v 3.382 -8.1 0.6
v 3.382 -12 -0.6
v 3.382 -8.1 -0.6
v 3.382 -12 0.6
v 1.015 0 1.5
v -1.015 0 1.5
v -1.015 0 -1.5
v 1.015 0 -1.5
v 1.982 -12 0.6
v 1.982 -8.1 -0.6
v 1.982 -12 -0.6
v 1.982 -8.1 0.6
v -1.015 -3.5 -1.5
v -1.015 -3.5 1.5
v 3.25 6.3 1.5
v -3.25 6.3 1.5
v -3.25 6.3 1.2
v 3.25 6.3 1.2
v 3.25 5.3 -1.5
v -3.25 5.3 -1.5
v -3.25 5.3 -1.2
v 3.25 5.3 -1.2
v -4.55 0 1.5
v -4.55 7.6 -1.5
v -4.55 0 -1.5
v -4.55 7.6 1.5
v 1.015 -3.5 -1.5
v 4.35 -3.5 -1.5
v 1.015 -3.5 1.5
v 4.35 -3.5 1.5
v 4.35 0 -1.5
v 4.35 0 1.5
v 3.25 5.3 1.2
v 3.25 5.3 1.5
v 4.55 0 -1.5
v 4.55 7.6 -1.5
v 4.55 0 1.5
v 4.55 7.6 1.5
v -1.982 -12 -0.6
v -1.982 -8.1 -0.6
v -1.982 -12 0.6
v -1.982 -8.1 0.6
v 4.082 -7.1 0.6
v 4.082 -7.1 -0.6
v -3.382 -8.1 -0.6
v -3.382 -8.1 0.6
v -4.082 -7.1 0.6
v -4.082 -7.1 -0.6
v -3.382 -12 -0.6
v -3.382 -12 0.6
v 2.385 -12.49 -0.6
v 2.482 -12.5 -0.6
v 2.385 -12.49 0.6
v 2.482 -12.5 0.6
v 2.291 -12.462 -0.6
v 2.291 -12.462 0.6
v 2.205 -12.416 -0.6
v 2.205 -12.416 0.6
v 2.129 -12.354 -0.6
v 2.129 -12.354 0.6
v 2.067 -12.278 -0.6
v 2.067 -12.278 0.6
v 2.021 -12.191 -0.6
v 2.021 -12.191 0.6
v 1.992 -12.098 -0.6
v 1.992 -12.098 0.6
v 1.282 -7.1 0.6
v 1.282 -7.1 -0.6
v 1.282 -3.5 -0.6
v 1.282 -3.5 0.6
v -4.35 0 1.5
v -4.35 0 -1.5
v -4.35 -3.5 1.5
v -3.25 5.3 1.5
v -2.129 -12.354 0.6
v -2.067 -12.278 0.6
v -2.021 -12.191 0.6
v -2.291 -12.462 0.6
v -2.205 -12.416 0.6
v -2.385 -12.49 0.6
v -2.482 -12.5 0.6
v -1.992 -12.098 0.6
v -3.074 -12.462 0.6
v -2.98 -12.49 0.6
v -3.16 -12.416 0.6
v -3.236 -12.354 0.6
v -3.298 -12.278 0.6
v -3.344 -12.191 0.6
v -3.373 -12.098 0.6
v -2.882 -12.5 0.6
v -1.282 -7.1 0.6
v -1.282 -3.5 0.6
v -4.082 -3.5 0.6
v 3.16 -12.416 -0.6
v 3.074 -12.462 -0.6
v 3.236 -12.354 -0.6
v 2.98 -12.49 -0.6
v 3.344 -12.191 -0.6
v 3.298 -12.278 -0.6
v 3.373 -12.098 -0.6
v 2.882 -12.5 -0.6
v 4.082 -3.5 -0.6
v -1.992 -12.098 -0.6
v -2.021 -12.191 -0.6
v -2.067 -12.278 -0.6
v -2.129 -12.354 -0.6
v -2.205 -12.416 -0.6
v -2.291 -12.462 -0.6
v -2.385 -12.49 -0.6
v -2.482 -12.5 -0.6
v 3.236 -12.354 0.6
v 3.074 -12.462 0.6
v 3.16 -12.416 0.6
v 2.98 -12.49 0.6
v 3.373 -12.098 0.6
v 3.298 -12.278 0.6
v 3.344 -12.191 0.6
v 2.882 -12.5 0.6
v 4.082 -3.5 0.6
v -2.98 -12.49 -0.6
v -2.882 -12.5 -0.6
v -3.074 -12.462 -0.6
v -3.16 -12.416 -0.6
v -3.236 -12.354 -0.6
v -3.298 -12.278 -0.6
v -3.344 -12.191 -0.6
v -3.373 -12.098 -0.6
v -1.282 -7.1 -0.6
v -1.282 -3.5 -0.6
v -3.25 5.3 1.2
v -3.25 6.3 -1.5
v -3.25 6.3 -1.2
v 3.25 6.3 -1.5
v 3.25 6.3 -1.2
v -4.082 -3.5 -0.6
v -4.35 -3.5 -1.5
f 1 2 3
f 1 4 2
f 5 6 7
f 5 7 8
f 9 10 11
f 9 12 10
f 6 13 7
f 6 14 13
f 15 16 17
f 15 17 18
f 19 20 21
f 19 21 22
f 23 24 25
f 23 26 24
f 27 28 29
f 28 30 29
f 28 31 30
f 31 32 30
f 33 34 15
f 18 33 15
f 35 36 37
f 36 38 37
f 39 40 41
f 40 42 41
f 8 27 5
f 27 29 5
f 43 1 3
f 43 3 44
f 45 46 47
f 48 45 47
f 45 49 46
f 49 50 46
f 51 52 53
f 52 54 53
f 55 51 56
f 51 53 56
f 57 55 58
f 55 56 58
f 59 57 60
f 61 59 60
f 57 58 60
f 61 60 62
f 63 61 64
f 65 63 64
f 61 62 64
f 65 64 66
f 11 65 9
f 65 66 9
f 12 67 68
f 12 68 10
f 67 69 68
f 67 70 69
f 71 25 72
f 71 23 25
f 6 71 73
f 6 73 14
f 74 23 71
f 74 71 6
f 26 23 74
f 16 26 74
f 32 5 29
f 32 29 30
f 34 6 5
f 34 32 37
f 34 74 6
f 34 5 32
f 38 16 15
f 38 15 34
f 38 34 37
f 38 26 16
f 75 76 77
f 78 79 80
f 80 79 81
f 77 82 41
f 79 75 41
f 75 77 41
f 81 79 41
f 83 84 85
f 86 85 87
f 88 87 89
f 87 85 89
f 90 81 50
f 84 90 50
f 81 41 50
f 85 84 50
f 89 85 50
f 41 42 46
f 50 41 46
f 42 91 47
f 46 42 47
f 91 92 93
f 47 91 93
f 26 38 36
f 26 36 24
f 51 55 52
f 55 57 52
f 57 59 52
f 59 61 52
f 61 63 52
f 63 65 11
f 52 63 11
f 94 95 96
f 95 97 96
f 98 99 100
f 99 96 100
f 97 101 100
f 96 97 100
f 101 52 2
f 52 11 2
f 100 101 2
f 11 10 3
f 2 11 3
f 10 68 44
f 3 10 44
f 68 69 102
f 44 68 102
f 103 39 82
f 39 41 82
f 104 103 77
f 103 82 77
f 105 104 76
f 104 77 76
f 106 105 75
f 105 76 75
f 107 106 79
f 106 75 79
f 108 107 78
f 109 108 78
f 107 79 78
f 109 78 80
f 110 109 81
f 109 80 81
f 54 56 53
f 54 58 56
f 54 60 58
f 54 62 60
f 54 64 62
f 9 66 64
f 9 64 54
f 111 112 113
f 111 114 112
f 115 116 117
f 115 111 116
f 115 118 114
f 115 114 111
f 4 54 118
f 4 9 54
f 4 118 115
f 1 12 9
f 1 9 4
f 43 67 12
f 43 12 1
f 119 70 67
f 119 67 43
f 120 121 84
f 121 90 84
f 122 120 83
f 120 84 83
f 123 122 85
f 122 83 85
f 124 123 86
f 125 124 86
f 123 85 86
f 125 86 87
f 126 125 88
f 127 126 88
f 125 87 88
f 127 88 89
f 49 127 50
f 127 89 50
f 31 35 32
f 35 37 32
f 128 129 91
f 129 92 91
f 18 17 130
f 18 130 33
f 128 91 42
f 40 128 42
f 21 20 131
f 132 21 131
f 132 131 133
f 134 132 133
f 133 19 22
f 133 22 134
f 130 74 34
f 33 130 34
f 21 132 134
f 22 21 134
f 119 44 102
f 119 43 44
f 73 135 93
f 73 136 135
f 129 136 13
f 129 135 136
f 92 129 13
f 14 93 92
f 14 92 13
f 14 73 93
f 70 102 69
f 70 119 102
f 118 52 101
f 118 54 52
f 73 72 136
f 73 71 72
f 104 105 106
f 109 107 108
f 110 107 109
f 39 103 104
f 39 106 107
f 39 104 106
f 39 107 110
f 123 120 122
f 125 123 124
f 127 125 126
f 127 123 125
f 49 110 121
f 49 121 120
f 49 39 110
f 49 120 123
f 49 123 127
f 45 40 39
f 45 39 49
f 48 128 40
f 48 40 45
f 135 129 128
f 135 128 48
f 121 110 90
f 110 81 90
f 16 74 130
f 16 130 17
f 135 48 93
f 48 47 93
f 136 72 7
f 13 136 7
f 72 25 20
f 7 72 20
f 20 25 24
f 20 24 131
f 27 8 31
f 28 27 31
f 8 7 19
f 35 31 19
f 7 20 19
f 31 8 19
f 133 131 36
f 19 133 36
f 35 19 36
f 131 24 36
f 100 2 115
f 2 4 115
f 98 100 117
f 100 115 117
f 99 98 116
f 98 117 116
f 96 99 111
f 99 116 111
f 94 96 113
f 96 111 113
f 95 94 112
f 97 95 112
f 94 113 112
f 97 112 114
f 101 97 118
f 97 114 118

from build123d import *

# Parameters (mm, degrees)
PLASTIC_BODY_DEPTH   = 1.5
SKETCH2_W            = 6.5
SKETCH2_H            = 1
CUT_GRIP_DEPTH       = 0.3
BOSS_EXTRUDE2_DEPTH  = 0.6
FILLET1_R            = 0.5
FILLET1_OF_MIRROR4_R = 0.5


with BuildPart() as part:
    # Sketch1 → plastic body (new body, symmetric)
    with BuildSketch(Plane.XY):
        Polygon((0, 7.6), (4.55, 7.6), (4.55, 0), (4.35, 0), (4.35, -3.5), (1.015, -3.5), (1.015, 0), (0, 0), align=None)
    plastic_body = extrude(amount=PLASTIC_BODY_DEPTH, both=True)

    # Mirror1: plastic body across plane
    add(plastic_body.mirror(Plane(origin=(0, 0, 0), x_dir=(0, 0, 1), z_dir=(1, 0, 0))))

    # Sketch2 → cut grip (cut, symmetric)
    with BuildSketch(Plane.XY.offset(1.5)):
        with Locations((0, 5.8)):
            Rectangle(SKETCH2_W, SKETCH2_H)
    cut_grip = extrude(amount=CUT_GRIP_DEPTH, both=True, mode=Mode.SUBTRACT)

    # Mirror2: cut grip across plane
    add(cut_grip.mirror(Plane.XY), mode=Mode.SUBTRACT)


with BuildPart() as body_2:
    # Sketch4 → Boss-Extrude2 (new body, symmetric)
    with BuildSketch(Plane.XY):
        Polygon((1.2825, -3.5), (1.2825, -7.1), (1.9825, -8.1), (1.9825, -12.5), (3.3825, -12.5), (3.3825, -8.1), (4.0825, -7.1), (4.0825, -3.5), align=None)
    boss_extrude2 = extrude(amount=BOSS_EXTRUDE2_DEPTH, both=True)

    # Fillet1
    fillet1_edges = [body_2.edges().sort_by_distance(p)[0] for p in [
        (3.3825, -12.5, 0),
        (1.9825, -12.5, 0),
    ]]
    fillet(fillet1_edges, radius=FILLET1_R)


with BuildPart() as part_1:
    add(part.part)

    # Mirror4: Boss-Extrude2 across plane
    add(boss_extrude2.mirror(Plane(origin=(0, 0, 0), x_dir=(0, 0, 1), z_dir=(1, 0, 0))))

    # Fillet1 of Mirror4
    fillet1_of_mirror4_edges = [part_1.edges().sort_by_distance(p)[0] for p in [
        (-3.3825, -12.5, 0),
        (-1.9825, -12.5, 0),
    ]]
    fillet(fillet1_of_mirror4_edges, radius=FILLET1_OF_MIRROR4_R)


solid = Compound([body_2.part, part_1.part])
